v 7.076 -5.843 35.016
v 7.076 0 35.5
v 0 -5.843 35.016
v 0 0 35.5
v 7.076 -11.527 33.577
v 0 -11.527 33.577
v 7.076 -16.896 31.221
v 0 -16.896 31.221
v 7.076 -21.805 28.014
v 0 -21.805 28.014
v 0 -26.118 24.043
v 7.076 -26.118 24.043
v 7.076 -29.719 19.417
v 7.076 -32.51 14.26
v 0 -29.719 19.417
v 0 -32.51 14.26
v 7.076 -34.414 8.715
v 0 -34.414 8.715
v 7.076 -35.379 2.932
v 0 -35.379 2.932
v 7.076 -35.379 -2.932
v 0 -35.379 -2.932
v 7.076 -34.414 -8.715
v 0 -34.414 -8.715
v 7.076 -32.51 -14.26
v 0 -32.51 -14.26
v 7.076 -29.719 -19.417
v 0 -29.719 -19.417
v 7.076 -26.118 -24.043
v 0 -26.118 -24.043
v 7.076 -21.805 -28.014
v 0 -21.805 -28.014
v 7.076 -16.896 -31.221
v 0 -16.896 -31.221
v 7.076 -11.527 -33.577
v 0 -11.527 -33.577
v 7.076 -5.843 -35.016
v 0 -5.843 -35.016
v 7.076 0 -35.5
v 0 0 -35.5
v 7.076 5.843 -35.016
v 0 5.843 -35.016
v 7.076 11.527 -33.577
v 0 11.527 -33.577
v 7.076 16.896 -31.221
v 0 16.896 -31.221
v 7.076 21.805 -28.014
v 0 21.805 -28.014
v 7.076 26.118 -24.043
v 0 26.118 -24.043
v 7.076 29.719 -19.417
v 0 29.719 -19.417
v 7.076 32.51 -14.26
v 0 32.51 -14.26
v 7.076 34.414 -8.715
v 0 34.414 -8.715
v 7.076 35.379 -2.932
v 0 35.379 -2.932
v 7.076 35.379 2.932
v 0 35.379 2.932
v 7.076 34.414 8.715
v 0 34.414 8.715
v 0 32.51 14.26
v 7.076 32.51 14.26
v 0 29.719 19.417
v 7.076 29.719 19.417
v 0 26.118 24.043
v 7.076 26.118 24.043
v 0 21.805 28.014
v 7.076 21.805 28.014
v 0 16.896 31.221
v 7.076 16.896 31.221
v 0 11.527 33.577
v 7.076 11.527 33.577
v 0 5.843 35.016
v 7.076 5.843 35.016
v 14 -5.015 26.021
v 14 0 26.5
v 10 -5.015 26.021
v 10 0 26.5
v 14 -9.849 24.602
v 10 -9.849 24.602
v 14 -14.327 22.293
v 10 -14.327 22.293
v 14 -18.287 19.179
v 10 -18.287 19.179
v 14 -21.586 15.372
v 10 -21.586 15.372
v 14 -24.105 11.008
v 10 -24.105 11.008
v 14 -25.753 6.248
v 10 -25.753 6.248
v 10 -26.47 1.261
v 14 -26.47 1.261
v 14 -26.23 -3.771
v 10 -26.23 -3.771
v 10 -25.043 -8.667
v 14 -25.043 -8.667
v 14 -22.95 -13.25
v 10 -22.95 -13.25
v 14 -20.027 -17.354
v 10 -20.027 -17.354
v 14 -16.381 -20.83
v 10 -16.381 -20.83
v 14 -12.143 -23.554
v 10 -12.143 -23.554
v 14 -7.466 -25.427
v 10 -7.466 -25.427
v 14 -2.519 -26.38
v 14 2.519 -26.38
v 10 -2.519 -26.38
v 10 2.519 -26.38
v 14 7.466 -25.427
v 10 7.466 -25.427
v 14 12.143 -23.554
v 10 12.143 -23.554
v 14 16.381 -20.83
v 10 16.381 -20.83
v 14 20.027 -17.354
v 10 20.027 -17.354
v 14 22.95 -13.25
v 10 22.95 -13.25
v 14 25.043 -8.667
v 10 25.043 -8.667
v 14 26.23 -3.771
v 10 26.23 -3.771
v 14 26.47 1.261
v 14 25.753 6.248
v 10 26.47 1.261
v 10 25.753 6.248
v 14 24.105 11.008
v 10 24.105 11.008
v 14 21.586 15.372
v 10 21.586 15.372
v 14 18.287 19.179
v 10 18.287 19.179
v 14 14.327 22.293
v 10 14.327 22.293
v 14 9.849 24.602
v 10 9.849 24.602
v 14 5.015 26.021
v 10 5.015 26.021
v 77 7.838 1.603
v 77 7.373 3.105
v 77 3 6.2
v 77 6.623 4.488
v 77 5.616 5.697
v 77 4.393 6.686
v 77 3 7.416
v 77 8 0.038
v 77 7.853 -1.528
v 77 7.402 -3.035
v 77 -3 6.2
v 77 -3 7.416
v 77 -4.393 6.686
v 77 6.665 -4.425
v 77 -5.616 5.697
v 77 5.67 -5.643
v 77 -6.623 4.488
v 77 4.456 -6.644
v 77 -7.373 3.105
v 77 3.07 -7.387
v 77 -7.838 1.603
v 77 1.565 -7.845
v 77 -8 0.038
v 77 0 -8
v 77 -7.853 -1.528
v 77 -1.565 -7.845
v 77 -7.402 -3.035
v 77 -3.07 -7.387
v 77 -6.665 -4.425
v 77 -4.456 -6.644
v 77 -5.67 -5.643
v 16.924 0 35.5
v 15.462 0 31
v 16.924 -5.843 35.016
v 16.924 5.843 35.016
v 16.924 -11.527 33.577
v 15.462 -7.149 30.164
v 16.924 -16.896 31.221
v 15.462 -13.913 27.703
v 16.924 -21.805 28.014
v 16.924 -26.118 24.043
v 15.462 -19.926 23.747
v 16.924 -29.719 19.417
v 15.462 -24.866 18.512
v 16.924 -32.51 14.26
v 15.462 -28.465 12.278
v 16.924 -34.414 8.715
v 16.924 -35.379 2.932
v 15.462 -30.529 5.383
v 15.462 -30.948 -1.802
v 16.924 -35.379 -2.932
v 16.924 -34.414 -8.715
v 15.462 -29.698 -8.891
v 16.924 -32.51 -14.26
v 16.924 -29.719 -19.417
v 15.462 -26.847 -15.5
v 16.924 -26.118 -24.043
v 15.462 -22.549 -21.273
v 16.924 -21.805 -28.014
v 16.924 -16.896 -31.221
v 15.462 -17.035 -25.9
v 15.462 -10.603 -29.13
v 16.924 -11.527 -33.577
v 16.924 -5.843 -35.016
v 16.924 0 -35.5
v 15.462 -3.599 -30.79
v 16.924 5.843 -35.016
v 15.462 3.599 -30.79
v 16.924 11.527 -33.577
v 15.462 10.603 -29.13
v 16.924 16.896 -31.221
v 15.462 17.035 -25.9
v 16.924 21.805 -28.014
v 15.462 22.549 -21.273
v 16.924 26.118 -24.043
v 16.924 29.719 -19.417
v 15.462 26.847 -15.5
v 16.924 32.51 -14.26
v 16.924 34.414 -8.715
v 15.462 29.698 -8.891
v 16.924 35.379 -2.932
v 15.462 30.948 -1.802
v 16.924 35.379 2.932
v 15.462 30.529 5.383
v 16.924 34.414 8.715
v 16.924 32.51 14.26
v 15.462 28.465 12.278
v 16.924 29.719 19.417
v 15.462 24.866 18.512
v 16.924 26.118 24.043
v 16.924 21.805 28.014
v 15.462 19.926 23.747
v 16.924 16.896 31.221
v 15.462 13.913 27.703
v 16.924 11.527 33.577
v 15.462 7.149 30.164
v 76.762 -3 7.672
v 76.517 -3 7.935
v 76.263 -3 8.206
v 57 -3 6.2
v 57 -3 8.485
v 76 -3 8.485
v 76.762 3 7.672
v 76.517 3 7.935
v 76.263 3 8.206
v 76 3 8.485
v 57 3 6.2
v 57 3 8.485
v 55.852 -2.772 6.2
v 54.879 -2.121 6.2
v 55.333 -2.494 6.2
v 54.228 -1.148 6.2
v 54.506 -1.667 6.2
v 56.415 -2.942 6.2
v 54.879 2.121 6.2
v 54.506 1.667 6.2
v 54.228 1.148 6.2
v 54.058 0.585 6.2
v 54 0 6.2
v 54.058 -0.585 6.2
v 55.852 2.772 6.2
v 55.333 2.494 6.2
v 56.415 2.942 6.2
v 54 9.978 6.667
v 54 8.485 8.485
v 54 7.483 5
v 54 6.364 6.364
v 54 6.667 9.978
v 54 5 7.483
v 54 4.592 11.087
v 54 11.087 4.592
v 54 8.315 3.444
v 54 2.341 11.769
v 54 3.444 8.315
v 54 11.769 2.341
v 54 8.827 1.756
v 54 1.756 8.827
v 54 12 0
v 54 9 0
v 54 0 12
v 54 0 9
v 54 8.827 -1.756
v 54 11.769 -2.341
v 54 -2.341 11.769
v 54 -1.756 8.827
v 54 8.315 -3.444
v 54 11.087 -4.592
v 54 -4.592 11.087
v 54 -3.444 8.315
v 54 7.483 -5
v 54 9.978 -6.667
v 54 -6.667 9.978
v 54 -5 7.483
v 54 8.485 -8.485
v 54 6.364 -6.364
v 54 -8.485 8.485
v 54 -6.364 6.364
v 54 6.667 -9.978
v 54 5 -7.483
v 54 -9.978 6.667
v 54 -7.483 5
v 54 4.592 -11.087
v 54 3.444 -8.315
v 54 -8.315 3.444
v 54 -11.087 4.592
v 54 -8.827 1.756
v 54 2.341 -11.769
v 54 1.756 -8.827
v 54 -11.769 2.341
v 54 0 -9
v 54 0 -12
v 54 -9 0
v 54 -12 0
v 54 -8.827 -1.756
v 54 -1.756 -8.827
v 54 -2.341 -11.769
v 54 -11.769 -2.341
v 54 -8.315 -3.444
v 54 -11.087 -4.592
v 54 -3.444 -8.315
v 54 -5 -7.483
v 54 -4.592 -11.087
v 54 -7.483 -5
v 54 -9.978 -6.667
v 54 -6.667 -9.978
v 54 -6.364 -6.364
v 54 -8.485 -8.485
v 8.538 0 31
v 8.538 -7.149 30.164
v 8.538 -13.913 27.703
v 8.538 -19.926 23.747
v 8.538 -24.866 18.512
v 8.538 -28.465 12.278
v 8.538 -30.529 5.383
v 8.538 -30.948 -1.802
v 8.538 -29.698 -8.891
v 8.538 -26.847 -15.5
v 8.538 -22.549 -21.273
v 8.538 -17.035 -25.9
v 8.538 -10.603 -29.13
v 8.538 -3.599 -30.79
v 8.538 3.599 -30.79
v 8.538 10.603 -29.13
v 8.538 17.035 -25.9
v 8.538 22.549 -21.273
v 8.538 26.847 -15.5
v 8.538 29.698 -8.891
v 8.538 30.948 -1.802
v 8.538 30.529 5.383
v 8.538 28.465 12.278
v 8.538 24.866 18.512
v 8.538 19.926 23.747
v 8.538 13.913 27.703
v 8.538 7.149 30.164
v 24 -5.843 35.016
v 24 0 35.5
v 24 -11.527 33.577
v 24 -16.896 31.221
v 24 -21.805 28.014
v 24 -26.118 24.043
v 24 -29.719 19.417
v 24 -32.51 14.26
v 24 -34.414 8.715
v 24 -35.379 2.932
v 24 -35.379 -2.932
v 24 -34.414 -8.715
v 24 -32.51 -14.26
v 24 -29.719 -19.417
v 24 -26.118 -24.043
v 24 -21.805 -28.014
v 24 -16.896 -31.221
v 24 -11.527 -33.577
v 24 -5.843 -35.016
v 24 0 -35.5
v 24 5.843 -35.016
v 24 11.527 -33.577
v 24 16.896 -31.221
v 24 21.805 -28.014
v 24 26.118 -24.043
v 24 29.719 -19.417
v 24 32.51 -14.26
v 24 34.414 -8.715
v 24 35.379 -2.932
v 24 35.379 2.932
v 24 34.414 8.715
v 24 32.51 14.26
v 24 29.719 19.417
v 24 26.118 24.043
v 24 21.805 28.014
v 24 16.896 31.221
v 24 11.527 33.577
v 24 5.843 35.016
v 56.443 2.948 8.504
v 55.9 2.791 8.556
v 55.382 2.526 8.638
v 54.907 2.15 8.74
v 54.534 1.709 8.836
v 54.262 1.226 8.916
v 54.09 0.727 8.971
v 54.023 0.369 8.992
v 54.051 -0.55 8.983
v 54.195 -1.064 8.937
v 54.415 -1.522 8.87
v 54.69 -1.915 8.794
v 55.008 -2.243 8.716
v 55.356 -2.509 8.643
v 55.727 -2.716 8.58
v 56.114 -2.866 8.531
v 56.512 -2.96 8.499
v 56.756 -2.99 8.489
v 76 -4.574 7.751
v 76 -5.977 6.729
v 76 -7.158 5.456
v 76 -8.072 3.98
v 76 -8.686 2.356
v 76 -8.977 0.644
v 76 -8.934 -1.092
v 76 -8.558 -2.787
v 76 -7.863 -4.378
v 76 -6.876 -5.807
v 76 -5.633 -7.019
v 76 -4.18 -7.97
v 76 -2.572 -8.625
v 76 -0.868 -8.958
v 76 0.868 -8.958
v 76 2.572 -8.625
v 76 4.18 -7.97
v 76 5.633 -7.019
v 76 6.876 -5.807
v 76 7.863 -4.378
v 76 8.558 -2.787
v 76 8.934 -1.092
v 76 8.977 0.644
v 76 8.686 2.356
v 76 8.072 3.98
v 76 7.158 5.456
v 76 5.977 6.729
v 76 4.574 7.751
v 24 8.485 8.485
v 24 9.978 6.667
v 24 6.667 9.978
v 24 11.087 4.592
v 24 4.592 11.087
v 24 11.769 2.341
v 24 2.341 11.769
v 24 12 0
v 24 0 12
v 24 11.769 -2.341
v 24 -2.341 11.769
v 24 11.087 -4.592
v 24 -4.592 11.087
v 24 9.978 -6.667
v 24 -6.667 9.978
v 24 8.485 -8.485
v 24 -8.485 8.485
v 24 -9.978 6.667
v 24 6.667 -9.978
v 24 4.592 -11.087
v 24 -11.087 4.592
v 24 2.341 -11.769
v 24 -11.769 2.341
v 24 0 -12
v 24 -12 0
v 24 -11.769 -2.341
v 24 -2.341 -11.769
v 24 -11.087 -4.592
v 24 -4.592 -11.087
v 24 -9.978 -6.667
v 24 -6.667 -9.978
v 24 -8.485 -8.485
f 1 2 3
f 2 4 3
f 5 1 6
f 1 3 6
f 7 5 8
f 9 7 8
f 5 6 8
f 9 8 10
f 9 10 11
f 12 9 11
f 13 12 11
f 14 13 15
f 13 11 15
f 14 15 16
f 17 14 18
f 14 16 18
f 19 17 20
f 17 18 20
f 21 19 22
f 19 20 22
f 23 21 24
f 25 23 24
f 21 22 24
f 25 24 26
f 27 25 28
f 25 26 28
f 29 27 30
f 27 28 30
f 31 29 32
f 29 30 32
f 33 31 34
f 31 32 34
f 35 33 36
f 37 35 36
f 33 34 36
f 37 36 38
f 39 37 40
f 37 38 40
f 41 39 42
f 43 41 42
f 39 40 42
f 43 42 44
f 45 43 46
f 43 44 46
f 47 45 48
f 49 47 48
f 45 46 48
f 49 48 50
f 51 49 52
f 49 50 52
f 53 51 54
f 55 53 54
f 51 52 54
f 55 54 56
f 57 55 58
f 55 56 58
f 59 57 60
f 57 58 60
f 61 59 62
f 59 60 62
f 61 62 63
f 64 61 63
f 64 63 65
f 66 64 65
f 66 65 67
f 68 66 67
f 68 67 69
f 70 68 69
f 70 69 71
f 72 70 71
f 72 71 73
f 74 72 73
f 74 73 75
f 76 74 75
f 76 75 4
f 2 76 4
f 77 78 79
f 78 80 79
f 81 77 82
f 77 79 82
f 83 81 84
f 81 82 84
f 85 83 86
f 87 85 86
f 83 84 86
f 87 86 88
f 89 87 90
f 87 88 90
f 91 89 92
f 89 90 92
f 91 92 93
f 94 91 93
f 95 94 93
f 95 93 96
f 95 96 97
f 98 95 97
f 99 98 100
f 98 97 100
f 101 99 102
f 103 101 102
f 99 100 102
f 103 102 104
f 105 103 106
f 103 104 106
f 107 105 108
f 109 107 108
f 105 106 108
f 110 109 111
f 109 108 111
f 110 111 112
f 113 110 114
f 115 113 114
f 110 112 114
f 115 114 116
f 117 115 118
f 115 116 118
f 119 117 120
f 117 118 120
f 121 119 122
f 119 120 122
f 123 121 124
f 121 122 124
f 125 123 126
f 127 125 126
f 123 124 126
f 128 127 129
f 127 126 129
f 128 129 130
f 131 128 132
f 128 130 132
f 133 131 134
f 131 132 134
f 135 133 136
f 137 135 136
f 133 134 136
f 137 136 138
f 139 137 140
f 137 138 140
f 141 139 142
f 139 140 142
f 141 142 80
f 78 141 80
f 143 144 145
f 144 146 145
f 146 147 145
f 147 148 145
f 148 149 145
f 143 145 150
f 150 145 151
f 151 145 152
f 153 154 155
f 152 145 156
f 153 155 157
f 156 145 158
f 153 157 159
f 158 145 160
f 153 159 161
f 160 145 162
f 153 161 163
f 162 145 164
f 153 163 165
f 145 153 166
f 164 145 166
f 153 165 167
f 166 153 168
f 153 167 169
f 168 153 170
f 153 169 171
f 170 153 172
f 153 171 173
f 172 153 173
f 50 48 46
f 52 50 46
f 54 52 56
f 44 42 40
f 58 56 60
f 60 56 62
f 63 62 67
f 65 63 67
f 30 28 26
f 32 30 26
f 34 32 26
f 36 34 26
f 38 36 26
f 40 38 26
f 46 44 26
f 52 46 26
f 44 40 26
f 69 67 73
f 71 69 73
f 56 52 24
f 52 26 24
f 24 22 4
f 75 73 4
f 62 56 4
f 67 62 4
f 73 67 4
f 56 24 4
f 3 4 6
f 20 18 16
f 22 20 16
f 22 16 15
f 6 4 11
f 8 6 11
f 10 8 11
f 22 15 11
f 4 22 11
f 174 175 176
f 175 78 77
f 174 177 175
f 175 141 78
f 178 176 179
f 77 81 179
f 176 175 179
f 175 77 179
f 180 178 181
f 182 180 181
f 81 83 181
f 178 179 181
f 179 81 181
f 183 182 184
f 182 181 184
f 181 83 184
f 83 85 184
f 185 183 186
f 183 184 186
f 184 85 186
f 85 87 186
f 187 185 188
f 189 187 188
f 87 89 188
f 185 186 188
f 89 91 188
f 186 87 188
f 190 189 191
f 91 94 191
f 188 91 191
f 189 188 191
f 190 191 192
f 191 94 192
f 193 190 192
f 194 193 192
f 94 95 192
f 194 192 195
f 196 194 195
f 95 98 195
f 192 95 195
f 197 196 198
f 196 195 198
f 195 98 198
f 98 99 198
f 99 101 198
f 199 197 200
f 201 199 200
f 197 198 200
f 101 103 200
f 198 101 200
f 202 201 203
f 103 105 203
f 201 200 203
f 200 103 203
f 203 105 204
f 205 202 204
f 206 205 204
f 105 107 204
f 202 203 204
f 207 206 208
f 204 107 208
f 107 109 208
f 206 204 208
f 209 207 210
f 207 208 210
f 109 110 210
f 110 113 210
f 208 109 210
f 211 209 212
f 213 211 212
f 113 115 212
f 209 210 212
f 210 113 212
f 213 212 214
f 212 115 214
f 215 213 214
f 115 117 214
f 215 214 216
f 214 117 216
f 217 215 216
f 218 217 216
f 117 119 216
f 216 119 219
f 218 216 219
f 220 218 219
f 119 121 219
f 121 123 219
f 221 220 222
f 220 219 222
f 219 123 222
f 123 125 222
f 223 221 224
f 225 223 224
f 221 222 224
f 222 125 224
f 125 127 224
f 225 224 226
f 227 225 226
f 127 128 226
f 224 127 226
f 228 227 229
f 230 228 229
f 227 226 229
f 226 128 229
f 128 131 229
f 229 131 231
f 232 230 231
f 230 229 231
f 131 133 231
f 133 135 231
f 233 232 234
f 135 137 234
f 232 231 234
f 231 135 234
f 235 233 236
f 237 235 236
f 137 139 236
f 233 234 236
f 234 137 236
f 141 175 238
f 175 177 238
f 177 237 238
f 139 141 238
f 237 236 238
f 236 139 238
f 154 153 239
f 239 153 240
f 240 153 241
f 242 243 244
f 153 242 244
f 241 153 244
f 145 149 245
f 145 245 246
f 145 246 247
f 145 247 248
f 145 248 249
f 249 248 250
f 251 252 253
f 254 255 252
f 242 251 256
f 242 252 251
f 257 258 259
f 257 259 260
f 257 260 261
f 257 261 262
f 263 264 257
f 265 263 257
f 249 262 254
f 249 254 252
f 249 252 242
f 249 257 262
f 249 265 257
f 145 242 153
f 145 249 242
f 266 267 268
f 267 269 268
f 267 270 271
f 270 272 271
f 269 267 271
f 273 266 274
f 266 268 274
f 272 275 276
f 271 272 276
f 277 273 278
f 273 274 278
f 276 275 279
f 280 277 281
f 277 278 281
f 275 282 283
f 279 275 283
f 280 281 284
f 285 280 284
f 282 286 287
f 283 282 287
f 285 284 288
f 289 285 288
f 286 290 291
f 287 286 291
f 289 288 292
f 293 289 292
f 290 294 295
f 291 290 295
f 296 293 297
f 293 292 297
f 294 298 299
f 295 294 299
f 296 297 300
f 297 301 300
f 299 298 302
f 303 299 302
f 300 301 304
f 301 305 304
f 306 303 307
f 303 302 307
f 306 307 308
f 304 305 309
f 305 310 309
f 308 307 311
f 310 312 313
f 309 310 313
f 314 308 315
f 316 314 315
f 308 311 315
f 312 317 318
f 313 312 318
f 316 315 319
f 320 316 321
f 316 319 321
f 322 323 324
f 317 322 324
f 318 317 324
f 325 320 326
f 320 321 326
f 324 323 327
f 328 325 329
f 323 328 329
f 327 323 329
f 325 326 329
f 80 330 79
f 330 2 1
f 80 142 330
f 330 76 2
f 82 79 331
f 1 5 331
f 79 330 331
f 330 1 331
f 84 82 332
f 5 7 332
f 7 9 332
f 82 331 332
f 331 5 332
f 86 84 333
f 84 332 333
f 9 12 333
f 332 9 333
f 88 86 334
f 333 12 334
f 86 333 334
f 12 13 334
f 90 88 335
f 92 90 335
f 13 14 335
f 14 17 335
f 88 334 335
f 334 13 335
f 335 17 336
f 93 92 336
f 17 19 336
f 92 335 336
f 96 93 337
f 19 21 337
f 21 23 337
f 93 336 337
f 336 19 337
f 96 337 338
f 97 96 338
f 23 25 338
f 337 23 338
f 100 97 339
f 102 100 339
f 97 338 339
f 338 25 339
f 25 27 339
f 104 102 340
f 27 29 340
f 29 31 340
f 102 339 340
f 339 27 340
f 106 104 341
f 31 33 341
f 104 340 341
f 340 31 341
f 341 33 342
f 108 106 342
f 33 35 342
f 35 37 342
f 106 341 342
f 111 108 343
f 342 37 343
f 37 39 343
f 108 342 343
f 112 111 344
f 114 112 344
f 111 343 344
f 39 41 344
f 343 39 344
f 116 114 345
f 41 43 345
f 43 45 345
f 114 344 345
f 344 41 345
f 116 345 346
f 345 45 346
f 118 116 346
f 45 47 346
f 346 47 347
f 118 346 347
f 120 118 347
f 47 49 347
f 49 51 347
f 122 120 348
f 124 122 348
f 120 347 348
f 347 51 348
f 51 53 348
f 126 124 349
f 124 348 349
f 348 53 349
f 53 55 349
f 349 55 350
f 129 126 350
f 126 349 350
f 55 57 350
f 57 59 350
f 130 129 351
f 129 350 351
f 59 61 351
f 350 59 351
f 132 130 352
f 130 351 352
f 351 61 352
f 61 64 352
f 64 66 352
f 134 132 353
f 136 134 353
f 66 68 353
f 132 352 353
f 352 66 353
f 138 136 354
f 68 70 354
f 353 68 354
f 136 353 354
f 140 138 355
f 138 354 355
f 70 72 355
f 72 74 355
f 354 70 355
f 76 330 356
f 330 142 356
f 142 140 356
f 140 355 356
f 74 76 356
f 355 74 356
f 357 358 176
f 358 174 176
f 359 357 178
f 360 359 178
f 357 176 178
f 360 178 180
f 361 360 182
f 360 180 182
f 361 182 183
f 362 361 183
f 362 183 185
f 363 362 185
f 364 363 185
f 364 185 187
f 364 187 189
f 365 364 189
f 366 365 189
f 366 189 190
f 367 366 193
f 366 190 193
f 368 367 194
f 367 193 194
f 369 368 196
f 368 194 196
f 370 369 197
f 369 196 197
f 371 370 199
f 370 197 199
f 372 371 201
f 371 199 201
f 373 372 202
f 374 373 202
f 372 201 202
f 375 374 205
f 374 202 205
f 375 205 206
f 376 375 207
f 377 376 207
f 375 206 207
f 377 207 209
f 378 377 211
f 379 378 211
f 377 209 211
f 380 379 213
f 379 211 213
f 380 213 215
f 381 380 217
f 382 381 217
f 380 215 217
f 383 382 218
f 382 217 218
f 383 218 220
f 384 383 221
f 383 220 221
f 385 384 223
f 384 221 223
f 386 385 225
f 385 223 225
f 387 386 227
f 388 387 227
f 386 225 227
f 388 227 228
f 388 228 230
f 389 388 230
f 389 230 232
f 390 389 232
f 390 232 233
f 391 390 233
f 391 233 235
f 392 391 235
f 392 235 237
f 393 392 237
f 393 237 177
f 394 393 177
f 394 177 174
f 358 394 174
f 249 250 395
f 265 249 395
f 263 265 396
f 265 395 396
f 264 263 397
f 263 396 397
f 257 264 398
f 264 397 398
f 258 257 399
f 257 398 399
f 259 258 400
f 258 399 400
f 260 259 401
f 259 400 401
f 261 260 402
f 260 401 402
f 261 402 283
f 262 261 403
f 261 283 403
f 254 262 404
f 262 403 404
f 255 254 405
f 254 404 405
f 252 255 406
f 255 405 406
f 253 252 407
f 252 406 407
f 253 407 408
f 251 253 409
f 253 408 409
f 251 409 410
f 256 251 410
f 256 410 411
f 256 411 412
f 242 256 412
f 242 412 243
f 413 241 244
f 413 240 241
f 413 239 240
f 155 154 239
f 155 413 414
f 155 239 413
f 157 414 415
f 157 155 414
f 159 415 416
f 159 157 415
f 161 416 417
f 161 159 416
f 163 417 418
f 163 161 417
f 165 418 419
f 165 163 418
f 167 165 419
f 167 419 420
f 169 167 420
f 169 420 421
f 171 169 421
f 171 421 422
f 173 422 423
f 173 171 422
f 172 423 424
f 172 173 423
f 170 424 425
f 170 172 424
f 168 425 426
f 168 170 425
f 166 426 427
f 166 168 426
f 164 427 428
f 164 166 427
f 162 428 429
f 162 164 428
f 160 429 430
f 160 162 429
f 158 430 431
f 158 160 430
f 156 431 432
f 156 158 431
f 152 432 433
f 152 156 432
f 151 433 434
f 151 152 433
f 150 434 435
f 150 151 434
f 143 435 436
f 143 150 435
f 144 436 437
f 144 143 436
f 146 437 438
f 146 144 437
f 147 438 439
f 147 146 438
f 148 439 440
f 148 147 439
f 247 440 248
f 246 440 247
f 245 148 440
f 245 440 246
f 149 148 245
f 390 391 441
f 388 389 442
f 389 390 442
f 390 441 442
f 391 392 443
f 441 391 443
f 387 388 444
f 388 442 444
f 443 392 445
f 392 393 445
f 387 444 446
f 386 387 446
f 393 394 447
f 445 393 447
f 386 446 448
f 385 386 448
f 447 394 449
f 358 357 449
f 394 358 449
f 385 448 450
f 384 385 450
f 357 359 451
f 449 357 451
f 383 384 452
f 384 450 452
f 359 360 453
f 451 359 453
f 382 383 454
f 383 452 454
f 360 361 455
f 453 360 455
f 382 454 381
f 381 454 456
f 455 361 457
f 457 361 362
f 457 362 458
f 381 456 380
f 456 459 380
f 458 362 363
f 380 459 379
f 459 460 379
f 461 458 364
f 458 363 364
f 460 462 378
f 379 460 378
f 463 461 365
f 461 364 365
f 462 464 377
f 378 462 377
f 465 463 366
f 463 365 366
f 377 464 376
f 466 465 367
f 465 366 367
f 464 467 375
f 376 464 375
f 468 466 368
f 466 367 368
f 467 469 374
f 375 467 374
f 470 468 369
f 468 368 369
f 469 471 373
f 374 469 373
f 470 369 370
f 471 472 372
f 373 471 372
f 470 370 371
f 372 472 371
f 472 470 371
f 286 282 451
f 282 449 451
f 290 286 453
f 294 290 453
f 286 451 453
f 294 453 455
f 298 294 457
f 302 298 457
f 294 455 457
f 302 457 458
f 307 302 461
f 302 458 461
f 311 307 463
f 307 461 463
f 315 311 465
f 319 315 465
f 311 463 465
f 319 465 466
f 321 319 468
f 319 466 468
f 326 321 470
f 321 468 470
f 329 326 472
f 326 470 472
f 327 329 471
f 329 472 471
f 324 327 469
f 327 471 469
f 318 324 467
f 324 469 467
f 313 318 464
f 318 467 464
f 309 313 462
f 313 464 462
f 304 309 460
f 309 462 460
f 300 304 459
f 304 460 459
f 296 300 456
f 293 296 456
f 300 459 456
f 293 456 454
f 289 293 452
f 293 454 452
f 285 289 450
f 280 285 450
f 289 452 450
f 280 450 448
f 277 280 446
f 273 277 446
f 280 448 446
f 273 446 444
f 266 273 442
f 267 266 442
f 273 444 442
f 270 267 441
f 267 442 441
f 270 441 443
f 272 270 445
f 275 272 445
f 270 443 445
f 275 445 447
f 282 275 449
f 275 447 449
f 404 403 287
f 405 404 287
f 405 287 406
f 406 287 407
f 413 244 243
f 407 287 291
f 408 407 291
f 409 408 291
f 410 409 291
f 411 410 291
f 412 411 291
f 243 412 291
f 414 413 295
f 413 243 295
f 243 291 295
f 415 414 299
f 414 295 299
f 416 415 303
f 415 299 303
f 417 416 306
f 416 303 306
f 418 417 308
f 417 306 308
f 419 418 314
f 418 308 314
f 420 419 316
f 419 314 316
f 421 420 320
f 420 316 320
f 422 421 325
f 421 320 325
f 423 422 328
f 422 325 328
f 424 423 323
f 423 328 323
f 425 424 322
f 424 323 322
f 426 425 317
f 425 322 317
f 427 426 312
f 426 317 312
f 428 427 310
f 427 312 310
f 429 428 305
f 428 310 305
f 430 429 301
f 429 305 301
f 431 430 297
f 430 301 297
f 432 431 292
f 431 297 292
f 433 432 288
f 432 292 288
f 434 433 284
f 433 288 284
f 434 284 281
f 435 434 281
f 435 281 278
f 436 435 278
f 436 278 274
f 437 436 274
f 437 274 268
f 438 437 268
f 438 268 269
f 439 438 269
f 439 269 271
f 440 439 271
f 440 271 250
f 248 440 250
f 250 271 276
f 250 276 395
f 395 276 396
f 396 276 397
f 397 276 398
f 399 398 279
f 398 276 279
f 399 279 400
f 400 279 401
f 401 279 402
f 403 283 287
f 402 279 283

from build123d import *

# Parameters (mm, degrees)
F4_DEPTH = 2.8
F5_SIZE  = 1


with BuildPart() as f1:
    # F0 (on Front) → F1 (revolve)
    with BuildSketch(Plane.XZ):
        Polygon((0, 35.5), (0, 0), (77, 0), (77, 9), (54, 9), (54, 12), (24, 12), (24, 35.5), (16.924277, 35.5), (14, 26.5), (10, 26.5), (7.075723, 35.5), align=None)
    revolve(axis=Axis((38.5, 0, 0), (1, 0, 0)))

    # F3 (on offset) → F4 (cut)
    with BuildSketch(Plane.XY.offset(9)):
        with BuildLine():
            Line((57, -3), (77, -3))
            Line((77, -3), (77, 3))
            Line((77, 3), (57, 3))
            ThreePointArc((57, 3), (54, 0), (57, -3))
        make_face()
    extrude(amount=-F4_DEPTH, mode=Mode.SUBTRACT)

    # F5
    f5_edges = [f1.edges().sort_by_distance(p)[0] for p in [
        (77, 0, -9),
    ]]
    chamfer(f5_edges, length=F5_SIZE)


solid = f1.part
